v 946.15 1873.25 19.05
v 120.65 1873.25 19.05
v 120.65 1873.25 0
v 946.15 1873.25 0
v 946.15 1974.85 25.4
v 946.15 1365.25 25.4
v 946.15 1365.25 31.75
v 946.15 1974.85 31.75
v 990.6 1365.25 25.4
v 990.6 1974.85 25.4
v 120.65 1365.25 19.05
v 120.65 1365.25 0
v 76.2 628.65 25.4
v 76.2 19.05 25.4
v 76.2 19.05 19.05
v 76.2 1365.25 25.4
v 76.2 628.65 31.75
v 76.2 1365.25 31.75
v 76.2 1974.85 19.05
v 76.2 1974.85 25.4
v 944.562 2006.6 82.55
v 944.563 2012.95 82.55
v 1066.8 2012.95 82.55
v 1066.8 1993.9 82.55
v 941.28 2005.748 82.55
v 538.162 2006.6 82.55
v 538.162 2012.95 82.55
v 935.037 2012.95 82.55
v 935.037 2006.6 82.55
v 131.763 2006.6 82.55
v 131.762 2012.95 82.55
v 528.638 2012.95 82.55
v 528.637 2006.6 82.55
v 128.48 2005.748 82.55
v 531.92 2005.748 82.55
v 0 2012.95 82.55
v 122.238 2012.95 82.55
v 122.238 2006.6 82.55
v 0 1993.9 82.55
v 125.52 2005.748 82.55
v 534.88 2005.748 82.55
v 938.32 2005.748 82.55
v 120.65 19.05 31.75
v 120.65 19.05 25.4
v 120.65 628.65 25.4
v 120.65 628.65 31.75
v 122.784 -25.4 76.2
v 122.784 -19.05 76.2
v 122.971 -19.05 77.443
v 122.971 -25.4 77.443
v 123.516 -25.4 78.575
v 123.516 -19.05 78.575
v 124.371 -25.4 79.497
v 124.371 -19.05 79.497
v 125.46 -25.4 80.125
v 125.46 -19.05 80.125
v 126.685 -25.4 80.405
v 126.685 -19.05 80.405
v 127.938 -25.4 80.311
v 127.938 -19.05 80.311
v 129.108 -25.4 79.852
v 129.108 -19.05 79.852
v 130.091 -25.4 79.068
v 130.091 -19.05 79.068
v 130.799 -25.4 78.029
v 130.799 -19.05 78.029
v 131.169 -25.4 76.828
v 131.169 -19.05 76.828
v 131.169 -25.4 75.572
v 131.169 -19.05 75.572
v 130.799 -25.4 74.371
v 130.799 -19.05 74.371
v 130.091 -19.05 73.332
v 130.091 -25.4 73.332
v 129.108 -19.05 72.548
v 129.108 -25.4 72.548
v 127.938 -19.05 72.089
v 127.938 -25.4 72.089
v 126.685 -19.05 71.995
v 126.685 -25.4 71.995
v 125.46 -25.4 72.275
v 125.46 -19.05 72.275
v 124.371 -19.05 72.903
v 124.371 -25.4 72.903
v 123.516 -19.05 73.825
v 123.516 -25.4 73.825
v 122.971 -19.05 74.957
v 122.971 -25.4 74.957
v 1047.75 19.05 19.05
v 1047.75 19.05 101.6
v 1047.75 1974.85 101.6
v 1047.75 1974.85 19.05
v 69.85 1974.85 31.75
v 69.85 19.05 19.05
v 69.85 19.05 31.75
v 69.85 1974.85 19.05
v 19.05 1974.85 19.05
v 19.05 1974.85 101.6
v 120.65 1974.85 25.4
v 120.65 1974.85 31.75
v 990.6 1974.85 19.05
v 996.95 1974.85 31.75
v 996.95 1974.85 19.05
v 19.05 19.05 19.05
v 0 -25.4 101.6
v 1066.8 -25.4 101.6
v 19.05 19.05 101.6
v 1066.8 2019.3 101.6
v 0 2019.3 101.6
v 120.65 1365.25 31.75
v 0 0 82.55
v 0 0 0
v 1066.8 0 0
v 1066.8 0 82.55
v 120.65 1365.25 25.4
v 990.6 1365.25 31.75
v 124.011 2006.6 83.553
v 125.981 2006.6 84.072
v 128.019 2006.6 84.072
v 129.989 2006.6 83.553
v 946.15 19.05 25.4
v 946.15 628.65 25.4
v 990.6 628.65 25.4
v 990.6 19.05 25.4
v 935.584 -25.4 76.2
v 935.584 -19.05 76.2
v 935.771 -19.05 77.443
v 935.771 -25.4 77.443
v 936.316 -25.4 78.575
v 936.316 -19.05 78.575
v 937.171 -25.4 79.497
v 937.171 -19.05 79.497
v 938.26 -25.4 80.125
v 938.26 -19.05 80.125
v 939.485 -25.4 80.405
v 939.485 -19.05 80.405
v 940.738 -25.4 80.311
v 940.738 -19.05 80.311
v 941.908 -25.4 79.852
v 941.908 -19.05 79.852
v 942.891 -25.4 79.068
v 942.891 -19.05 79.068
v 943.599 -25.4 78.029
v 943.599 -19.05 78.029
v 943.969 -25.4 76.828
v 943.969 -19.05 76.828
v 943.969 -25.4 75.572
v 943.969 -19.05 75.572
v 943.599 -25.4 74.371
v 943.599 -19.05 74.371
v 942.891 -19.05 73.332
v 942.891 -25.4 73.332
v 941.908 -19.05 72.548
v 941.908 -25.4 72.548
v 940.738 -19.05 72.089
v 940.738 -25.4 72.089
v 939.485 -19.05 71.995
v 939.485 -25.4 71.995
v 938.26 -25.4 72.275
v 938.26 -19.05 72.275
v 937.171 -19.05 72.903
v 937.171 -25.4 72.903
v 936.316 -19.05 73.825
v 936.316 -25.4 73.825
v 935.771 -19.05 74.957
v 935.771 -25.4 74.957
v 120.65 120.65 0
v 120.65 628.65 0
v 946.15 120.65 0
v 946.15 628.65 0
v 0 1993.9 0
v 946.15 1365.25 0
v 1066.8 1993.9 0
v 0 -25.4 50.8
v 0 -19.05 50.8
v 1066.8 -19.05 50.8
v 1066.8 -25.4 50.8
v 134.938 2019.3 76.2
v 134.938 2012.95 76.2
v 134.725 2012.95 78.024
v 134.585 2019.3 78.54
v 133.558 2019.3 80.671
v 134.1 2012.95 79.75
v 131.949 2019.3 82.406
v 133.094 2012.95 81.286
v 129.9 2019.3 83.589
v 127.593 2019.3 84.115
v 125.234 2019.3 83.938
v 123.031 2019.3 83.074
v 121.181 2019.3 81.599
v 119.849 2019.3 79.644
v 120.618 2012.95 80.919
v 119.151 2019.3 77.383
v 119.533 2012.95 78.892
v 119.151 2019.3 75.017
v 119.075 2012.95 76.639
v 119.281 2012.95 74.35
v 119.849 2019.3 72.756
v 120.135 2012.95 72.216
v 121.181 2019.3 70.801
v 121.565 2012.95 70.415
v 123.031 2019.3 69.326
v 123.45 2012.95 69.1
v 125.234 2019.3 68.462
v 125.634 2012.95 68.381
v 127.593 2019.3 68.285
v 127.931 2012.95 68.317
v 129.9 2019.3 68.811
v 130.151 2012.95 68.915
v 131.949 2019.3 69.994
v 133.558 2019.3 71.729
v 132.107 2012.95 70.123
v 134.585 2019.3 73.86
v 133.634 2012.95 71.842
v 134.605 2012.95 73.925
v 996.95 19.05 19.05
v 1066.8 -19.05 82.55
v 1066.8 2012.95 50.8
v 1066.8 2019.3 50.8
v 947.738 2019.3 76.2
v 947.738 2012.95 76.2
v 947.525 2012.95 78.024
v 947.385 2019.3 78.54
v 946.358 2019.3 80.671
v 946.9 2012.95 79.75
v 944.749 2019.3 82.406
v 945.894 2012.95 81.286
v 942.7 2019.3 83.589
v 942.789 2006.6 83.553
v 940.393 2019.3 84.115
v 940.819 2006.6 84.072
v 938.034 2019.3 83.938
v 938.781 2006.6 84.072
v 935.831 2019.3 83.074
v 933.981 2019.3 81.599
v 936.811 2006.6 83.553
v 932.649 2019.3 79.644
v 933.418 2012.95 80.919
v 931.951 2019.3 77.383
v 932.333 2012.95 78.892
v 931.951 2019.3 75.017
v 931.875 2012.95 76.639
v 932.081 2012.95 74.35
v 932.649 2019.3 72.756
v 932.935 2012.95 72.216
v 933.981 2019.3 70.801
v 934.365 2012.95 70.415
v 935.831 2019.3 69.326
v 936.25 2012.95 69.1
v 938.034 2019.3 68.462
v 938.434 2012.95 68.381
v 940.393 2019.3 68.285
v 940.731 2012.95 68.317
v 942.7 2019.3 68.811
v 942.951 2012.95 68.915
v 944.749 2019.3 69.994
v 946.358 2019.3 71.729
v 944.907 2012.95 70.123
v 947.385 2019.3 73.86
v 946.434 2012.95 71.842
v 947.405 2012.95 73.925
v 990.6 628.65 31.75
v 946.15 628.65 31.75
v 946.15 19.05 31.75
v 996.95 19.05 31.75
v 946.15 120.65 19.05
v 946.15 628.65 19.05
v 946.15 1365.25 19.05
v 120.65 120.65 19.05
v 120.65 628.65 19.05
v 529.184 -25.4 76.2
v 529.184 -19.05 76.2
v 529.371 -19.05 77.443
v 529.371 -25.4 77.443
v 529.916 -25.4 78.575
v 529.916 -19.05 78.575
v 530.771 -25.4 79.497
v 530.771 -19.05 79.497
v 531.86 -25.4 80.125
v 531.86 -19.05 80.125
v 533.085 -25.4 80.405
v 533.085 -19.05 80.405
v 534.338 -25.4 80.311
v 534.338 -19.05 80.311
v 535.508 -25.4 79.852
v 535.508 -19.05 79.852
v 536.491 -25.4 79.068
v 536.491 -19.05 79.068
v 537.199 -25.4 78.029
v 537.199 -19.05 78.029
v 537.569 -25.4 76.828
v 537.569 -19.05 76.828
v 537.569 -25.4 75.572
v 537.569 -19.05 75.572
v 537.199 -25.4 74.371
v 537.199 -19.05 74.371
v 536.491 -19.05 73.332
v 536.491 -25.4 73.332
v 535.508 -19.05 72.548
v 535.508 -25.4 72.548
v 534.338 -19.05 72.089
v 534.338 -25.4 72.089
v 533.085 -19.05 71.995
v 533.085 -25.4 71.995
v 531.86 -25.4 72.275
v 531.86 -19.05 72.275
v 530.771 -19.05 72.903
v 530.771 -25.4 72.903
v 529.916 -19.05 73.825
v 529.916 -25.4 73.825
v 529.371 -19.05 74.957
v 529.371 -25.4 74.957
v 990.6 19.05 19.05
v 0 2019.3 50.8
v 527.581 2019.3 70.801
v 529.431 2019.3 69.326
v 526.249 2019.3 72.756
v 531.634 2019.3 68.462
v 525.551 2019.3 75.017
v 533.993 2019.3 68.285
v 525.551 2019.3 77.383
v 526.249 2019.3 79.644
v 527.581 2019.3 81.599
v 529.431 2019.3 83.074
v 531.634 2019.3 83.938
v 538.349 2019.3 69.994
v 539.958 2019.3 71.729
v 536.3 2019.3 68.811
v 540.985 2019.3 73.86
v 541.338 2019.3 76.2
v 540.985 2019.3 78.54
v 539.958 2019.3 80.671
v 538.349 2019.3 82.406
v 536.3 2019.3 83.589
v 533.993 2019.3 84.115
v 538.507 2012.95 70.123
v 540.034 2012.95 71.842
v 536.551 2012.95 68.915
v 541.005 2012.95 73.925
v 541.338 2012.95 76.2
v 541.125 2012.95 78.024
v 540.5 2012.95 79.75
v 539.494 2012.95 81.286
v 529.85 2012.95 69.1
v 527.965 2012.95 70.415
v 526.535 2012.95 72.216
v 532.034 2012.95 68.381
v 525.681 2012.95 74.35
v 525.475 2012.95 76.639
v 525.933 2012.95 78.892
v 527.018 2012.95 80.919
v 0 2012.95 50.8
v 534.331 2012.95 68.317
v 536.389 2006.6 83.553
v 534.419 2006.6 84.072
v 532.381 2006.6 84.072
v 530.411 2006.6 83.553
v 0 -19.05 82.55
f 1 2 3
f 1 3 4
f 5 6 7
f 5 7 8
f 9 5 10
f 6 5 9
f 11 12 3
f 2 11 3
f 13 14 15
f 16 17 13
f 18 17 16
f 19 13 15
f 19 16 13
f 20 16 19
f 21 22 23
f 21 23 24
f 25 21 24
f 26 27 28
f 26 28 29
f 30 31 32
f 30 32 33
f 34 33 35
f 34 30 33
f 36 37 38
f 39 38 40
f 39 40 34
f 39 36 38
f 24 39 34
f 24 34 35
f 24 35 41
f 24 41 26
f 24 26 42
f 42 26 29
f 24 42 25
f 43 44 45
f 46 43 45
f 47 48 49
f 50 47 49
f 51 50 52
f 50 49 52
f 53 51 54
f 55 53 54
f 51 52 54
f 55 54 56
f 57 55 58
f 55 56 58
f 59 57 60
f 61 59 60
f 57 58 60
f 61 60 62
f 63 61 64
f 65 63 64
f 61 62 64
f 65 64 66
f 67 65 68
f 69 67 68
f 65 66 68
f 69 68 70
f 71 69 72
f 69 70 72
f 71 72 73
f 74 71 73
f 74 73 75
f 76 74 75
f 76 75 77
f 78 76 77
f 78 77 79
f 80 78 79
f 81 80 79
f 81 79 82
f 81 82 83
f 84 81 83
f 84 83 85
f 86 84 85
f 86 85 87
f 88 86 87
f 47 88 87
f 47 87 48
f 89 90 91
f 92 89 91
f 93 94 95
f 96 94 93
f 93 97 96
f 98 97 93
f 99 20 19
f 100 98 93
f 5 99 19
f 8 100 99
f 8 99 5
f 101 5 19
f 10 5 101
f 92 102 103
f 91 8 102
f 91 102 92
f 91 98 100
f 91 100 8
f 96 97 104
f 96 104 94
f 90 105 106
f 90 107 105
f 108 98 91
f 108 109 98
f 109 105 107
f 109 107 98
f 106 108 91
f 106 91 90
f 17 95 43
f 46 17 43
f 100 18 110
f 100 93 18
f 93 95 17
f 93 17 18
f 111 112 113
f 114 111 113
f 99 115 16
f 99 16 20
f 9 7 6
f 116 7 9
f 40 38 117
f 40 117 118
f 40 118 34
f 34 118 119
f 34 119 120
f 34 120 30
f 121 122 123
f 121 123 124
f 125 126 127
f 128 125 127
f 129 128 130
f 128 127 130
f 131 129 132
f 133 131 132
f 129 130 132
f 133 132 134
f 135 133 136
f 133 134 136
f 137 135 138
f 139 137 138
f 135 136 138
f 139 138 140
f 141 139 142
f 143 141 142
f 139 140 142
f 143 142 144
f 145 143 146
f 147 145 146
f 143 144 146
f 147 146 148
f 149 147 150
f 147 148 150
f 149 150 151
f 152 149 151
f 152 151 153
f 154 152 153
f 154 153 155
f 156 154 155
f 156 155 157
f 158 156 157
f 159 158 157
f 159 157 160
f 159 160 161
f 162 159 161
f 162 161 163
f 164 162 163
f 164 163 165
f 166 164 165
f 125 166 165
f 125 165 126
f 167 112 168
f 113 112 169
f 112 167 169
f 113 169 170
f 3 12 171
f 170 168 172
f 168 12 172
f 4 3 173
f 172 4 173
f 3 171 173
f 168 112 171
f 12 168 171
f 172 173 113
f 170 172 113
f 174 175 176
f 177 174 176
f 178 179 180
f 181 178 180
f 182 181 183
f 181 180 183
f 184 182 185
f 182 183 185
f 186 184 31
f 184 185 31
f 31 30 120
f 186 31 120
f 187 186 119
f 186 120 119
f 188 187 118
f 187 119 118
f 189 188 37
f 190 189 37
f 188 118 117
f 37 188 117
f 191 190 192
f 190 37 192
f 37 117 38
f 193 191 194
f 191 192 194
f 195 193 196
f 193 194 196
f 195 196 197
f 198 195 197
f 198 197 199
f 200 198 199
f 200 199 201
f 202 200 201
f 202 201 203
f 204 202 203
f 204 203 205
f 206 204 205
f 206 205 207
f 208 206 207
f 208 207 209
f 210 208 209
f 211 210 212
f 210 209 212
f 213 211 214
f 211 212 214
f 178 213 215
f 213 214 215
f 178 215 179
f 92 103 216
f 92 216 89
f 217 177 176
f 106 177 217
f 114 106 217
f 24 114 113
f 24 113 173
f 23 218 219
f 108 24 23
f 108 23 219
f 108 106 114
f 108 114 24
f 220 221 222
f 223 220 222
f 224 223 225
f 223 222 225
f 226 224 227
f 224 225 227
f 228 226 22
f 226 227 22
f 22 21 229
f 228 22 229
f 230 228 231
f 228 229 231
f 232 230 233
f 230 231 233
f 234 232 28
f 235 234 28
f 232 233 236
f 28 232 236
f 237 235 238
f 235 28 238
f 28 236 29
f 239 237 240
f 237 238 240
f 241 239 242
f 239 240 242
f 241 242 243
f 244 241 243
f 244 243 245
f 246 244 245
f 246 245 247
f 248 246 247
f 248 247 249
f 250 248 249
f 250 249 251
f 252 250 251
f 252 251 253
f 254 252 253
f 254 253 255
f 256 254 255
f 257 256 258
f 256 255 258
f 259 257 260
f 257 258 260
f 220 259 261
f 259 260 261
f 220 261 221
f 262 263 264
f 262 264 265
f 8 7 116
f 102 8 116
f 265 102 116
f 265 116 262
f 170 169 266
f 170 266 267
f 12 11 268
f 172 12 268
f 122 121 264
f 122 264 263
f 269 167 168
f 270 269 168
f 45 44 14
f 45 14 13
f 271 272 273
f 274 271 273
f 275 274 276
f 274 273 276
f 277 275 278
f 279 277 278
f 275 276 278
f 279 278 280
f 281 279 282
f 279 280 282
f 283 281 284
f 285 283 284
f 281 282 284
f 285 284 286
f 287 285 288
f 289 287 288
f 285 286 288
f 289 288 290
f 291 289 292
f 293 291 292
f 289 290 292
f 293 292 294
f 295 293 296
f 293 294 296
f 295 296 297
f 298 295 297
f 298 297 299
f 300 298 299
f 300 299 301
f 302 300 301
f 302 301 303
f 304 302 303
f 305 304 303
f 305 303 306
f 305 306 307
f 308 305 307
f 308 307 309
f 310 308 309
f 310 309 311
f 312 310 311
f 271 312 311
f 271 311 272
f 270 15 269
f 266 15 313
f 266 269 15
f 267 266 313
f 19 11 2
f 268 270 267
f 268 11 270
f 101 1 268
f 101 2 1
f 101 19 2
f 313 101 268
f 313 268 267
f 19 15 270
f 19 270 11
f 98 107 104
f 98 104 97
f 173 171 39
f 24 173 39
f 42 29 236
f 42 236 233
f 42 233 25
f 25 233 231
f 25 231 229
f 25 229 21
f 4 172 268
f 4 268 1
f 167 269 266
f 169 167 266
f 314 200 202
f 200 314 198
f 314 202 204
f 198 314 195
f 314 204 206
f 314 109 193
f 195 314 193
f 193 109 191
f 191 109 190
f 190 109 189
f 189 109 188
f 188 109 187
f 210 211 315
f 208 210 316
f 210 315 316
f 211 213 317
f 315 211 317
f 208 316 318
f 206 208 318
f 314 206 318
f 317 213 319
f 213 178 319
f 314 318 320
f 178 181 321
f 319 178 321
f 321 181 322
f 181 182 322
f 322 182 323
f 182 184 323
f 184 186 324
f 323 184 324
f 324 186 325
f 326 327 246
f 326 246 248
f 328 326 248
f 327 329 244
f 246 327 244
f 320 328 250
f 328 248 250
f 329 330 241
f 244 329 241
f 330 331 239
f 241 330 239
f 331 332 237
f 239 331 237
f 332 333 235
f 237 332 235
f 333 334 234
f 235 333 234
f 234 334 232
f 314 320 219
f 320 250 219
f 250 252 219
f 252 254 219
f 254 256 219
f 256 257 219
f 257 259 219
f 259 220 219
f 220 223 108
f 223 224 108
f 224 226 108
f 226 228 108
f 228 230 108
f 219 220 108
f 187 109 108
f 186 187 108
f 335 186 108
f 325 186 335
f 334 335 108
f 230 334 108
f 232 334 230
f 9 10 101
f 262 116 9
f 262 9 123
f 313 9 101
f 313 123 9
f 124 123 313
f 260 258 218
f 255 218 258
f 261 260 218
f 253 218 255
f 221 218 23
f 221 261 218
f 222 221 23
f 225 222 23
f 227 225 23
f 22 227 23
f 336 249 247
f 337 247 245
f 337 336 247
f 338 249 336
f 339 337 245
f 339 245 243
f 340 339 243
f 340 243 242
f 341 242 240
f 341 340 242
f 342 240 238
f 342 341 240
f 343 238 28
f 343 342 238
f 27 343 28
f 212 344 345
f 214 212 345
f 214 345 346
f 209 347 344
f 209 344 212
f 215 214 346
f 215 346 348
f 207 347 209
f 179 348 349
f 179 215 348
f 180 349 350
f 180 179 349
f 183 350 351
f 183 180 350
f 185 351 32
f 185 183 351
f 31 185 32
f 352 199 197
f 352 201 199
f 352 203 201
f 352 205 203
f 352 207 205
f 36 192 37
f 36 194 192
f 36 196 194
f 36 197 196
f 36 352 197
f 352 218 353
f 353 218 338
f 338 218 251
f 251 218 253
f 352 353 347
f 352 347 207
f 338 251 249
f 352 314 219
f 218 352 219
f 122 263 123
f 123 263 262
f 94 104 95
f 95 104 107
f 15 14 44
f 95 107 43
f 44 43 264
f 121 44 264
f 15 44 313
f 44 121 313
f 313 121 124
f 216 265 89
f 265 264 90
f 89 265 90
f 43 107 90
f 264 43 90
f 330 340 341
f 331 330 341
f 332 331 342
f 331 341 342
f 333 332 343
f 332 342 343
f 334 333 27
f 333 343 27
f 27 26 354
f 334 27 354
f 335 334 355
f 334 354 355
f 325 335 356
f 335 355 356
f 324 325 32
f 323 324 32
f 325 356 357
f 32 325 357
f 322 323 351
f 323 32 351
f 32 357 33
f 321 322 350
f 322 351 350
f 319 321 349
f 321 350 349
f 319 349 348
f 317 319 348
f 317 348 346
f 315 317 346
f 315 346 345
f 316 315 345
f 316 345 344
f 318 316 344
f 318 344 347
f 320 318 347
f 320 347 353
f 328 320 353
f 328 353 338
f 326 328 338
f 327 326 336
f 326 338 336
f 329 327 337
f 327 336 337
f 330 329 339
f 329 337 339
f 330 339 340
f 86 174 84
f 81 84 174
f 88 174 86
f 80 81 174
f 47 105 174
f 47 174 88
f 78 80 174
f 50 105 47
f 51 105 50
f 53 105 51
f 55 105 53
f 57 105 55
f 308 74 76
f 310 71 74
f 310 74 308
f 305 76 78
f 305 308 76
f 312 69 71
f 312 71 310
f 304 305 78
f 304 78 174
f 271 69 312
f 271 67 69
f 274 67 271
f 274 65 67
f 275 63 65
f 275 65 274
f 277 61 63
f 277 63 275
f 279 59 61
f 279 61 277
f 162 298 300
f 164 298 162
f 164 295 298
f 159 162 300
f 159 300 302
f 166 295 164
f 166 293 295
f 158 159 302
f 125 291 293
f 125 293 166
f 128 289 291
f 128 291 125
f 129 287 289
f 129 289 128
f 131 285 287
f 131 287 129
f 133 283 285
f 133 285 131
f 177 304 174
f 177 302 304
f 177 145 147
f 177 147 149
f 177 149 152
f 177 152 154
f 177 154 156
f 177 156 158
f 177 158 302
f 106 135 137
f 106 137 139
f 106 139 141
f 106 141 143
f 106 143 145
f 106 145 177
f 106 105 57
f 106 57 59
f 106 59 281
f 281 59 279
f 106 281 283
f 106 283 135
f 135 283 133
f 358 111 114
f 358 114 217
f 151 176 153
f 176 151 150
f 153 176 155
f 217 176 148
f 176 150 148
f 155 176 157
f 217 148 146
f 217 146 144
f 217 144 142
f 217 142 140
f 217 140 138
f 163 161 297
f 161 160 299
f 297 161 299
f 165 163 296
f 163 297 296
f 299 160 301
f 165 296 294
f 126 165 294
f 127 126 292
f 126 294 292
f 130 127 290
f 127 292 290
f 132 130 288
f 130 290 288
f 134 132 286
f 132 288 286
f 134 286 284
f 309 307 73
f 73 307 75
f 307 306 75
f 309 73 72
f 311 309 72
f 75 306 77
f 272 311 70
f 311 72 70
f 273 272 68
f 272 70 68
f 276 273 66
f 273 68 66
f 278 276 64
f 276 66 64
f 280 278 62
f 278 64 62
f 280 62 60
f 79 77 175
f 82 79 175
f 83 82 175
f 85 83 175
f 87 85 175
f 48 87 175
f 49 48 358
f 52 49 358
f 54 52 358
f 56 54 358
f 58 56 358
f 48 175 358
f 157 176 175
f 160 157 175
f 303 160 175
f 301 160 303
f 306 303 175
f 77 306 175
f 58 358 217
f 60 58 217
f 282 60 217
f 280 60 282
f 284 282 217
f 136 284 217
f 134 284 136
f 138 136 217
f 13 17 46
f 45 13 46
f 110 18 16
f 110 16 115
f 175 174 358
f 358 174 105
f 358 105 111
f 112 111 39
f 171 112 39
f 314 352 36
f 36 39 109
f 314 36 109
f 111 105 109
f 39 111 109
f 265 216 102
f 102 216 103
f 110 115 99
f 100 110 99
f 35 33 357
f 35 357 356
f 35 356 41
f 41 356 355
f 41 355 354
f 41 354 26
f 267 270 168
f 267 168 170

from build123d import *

# Parameters (mm, degrees)
F0_W      = 1066.8
F0_H      = 1993.9
F1_DEPTH  = 101.6
F2_W      = 1028.7
F2_H      = 1955.8
F3_DEPTH  = 82.55
F4_W      = 825.5
F4_H      = 508
F5_DEPTH  = 19.051
F6_W      = 1066.8
F6_H      = 25.4
F7_DEPTH  = 50.8
F8_W      = 19.05
F8_H      = 31.75
F9_DEPTH  = 1066.801
F11_D     = 15.875
F11_DEPTH = 12.7
F11_TIP   = 4.7693311635
F13_D     = 8.4328
F13_DEPTH = 12.7
F13_TIP   = 2.5334687141
F14_W     = 50.8
F14_H     = 1955.8
F15_DEPTH = 12.7
F16_W     = 1955.8
F16_H     = 6.35
F17_DEPTH = 44.45
F18_W     = 1955.8
F18_H     = 6.35
F19_DEPTH = 44.45
F20_W     = 44.45
F20_H     = 736.6
F21_DEPTH = 12.7


with BuildPart() as f1:
    # F0 (on Top) → F1 (new body)
    with BuildSketch(Plane.XY):
        with Locations((533.4, 996.95)):
            Rectangle(F0_W, F0_H)
    extrude(amount=F1_DEPTH)

    # F2 (on face) → F3 (cut)
    with BuildSketch(Plane.XY.offset(101.6)):
        with Locations((533.4, 996.95)):
            Rectangle(F2_W, F2_H)
    extrude(amount=-F3_DEPTH, mode=Mode.SUBTRACT)

    # F4 (on face) → F5 (cut, through all)
    with BuildSketch(Plane.XY.offset(19.05)):
        with Locations((533.4, 1619.25)):
            Rectangle(F4_W, F4_H)
        with Locations((533.4, 374.65)):
            Rectangle(F4_W, F4_H)
    extrude(amount=-F5_DEPTH, mode=Mode.SUBTRACT)

    # F6 (on face) → F7 (join)
    with BuildSketch(Plane.XY.offset(101.6)):
        with Locations((533.4, 2006.6)):
            Rectangle(F6_W, F6_H)
        with Locations((533.4, -12.7)):
            Rectangle(F6_W, F6_H)
    extrude(amount=-F7_DEPTH)

    # F8 (on face) → F9 (cut, through all)
    with BuildSketch(Plane(origin=(0, 0, 0), x_dir=(0, -1, 0), z_dir=(-1, 0, 0))):
        with Locations((-2003.425, 66.675)):
            Rectangle(F8_W, F8_H)
        with Locations((9.525, 66.675)):
            Rectangle(F8_W, F8_H)
    extrude(amount=-F9_DEPTH, mode=Mode.SUBTRACT)

    # F11
    with Locations(Plane(origin=(0, 2019.3, 0), x_dir=(-1, 0, 0), z_dir=(0, 1, 0))):
        with Locations((-939.8, 76.2), (-533.4, 76.2), (-127, 76.2)):
            Hole(F11_D / 2, depth=F11_DEPTH)
            with Locations((0, 0, -(F11_DEPTH + F11_TIP / 2))):  # 118° drill point
                Cone(0, F11_D / 2, F11_TIP, mode=Mode.SUBTRACT)

    # F13
    with Locations(Plane.XZ.offset(25.4)):
        with Locations((127, 76.2), (533.4, 76.2), (939.8, 76.2)):
            Hole(F13_D / 2, depth=F13_DEPTH)
            with Locations((0, 0, -(F13_DEPTH + F13_TIP / 2))):  # 118° drill point
                Cone(0, F13_D / 2, F13_TIP, mode=Mode.SUBTRACT)

    # F14 (on face) → F15 (join)
    with BuildSketch(Plane.XY.offset(19.05)):
        with Locations((95.25, 996.95)):
            Rectangle(F14_W, F14_H)
        with Locations((971.55, 996.95)):
            Rectangle(F14_W, F14_H)
    extrude(amount=F15_DEPTH)

    # F16 (on face) → F17 (cut)
    with BuildSketch(Plane(origin=(946.15, 0, 0), x_dir=(0, -1, 0), z_dir=(-1, 0, 0))):
        with Locations((-996.95, 22.225)):
            Rectangle(F16_W, F16_H)
    extrude(amount=-F17_DEPTH, mode=Mode.SUBTRACT)

    # F18 (on face) → F19 (cut)
    with BuildSketch(Plane.YZ.offset(120.65)):
        with Locations((996.95, 22.225)):
            Rectangle(F18_W, F18_H)
    extrude(amount=-F19_DEPTH, mode=Mode.SUBTRACT)

    # F20 (on face) → F21 (cut, through all)
    with BuildSketch(Plane.XY.offset(31.75)):
        with Locations((968.375, 996.95)):
            Rectangle(F20_W, F20_H)
        with Locations((98.425, 996.95)):
            Rectangle(F20_W, F20_H)
    extrude(amount=-F21_DEPTH, mode=Mode.SUBTRACT)


solid = f1.part
